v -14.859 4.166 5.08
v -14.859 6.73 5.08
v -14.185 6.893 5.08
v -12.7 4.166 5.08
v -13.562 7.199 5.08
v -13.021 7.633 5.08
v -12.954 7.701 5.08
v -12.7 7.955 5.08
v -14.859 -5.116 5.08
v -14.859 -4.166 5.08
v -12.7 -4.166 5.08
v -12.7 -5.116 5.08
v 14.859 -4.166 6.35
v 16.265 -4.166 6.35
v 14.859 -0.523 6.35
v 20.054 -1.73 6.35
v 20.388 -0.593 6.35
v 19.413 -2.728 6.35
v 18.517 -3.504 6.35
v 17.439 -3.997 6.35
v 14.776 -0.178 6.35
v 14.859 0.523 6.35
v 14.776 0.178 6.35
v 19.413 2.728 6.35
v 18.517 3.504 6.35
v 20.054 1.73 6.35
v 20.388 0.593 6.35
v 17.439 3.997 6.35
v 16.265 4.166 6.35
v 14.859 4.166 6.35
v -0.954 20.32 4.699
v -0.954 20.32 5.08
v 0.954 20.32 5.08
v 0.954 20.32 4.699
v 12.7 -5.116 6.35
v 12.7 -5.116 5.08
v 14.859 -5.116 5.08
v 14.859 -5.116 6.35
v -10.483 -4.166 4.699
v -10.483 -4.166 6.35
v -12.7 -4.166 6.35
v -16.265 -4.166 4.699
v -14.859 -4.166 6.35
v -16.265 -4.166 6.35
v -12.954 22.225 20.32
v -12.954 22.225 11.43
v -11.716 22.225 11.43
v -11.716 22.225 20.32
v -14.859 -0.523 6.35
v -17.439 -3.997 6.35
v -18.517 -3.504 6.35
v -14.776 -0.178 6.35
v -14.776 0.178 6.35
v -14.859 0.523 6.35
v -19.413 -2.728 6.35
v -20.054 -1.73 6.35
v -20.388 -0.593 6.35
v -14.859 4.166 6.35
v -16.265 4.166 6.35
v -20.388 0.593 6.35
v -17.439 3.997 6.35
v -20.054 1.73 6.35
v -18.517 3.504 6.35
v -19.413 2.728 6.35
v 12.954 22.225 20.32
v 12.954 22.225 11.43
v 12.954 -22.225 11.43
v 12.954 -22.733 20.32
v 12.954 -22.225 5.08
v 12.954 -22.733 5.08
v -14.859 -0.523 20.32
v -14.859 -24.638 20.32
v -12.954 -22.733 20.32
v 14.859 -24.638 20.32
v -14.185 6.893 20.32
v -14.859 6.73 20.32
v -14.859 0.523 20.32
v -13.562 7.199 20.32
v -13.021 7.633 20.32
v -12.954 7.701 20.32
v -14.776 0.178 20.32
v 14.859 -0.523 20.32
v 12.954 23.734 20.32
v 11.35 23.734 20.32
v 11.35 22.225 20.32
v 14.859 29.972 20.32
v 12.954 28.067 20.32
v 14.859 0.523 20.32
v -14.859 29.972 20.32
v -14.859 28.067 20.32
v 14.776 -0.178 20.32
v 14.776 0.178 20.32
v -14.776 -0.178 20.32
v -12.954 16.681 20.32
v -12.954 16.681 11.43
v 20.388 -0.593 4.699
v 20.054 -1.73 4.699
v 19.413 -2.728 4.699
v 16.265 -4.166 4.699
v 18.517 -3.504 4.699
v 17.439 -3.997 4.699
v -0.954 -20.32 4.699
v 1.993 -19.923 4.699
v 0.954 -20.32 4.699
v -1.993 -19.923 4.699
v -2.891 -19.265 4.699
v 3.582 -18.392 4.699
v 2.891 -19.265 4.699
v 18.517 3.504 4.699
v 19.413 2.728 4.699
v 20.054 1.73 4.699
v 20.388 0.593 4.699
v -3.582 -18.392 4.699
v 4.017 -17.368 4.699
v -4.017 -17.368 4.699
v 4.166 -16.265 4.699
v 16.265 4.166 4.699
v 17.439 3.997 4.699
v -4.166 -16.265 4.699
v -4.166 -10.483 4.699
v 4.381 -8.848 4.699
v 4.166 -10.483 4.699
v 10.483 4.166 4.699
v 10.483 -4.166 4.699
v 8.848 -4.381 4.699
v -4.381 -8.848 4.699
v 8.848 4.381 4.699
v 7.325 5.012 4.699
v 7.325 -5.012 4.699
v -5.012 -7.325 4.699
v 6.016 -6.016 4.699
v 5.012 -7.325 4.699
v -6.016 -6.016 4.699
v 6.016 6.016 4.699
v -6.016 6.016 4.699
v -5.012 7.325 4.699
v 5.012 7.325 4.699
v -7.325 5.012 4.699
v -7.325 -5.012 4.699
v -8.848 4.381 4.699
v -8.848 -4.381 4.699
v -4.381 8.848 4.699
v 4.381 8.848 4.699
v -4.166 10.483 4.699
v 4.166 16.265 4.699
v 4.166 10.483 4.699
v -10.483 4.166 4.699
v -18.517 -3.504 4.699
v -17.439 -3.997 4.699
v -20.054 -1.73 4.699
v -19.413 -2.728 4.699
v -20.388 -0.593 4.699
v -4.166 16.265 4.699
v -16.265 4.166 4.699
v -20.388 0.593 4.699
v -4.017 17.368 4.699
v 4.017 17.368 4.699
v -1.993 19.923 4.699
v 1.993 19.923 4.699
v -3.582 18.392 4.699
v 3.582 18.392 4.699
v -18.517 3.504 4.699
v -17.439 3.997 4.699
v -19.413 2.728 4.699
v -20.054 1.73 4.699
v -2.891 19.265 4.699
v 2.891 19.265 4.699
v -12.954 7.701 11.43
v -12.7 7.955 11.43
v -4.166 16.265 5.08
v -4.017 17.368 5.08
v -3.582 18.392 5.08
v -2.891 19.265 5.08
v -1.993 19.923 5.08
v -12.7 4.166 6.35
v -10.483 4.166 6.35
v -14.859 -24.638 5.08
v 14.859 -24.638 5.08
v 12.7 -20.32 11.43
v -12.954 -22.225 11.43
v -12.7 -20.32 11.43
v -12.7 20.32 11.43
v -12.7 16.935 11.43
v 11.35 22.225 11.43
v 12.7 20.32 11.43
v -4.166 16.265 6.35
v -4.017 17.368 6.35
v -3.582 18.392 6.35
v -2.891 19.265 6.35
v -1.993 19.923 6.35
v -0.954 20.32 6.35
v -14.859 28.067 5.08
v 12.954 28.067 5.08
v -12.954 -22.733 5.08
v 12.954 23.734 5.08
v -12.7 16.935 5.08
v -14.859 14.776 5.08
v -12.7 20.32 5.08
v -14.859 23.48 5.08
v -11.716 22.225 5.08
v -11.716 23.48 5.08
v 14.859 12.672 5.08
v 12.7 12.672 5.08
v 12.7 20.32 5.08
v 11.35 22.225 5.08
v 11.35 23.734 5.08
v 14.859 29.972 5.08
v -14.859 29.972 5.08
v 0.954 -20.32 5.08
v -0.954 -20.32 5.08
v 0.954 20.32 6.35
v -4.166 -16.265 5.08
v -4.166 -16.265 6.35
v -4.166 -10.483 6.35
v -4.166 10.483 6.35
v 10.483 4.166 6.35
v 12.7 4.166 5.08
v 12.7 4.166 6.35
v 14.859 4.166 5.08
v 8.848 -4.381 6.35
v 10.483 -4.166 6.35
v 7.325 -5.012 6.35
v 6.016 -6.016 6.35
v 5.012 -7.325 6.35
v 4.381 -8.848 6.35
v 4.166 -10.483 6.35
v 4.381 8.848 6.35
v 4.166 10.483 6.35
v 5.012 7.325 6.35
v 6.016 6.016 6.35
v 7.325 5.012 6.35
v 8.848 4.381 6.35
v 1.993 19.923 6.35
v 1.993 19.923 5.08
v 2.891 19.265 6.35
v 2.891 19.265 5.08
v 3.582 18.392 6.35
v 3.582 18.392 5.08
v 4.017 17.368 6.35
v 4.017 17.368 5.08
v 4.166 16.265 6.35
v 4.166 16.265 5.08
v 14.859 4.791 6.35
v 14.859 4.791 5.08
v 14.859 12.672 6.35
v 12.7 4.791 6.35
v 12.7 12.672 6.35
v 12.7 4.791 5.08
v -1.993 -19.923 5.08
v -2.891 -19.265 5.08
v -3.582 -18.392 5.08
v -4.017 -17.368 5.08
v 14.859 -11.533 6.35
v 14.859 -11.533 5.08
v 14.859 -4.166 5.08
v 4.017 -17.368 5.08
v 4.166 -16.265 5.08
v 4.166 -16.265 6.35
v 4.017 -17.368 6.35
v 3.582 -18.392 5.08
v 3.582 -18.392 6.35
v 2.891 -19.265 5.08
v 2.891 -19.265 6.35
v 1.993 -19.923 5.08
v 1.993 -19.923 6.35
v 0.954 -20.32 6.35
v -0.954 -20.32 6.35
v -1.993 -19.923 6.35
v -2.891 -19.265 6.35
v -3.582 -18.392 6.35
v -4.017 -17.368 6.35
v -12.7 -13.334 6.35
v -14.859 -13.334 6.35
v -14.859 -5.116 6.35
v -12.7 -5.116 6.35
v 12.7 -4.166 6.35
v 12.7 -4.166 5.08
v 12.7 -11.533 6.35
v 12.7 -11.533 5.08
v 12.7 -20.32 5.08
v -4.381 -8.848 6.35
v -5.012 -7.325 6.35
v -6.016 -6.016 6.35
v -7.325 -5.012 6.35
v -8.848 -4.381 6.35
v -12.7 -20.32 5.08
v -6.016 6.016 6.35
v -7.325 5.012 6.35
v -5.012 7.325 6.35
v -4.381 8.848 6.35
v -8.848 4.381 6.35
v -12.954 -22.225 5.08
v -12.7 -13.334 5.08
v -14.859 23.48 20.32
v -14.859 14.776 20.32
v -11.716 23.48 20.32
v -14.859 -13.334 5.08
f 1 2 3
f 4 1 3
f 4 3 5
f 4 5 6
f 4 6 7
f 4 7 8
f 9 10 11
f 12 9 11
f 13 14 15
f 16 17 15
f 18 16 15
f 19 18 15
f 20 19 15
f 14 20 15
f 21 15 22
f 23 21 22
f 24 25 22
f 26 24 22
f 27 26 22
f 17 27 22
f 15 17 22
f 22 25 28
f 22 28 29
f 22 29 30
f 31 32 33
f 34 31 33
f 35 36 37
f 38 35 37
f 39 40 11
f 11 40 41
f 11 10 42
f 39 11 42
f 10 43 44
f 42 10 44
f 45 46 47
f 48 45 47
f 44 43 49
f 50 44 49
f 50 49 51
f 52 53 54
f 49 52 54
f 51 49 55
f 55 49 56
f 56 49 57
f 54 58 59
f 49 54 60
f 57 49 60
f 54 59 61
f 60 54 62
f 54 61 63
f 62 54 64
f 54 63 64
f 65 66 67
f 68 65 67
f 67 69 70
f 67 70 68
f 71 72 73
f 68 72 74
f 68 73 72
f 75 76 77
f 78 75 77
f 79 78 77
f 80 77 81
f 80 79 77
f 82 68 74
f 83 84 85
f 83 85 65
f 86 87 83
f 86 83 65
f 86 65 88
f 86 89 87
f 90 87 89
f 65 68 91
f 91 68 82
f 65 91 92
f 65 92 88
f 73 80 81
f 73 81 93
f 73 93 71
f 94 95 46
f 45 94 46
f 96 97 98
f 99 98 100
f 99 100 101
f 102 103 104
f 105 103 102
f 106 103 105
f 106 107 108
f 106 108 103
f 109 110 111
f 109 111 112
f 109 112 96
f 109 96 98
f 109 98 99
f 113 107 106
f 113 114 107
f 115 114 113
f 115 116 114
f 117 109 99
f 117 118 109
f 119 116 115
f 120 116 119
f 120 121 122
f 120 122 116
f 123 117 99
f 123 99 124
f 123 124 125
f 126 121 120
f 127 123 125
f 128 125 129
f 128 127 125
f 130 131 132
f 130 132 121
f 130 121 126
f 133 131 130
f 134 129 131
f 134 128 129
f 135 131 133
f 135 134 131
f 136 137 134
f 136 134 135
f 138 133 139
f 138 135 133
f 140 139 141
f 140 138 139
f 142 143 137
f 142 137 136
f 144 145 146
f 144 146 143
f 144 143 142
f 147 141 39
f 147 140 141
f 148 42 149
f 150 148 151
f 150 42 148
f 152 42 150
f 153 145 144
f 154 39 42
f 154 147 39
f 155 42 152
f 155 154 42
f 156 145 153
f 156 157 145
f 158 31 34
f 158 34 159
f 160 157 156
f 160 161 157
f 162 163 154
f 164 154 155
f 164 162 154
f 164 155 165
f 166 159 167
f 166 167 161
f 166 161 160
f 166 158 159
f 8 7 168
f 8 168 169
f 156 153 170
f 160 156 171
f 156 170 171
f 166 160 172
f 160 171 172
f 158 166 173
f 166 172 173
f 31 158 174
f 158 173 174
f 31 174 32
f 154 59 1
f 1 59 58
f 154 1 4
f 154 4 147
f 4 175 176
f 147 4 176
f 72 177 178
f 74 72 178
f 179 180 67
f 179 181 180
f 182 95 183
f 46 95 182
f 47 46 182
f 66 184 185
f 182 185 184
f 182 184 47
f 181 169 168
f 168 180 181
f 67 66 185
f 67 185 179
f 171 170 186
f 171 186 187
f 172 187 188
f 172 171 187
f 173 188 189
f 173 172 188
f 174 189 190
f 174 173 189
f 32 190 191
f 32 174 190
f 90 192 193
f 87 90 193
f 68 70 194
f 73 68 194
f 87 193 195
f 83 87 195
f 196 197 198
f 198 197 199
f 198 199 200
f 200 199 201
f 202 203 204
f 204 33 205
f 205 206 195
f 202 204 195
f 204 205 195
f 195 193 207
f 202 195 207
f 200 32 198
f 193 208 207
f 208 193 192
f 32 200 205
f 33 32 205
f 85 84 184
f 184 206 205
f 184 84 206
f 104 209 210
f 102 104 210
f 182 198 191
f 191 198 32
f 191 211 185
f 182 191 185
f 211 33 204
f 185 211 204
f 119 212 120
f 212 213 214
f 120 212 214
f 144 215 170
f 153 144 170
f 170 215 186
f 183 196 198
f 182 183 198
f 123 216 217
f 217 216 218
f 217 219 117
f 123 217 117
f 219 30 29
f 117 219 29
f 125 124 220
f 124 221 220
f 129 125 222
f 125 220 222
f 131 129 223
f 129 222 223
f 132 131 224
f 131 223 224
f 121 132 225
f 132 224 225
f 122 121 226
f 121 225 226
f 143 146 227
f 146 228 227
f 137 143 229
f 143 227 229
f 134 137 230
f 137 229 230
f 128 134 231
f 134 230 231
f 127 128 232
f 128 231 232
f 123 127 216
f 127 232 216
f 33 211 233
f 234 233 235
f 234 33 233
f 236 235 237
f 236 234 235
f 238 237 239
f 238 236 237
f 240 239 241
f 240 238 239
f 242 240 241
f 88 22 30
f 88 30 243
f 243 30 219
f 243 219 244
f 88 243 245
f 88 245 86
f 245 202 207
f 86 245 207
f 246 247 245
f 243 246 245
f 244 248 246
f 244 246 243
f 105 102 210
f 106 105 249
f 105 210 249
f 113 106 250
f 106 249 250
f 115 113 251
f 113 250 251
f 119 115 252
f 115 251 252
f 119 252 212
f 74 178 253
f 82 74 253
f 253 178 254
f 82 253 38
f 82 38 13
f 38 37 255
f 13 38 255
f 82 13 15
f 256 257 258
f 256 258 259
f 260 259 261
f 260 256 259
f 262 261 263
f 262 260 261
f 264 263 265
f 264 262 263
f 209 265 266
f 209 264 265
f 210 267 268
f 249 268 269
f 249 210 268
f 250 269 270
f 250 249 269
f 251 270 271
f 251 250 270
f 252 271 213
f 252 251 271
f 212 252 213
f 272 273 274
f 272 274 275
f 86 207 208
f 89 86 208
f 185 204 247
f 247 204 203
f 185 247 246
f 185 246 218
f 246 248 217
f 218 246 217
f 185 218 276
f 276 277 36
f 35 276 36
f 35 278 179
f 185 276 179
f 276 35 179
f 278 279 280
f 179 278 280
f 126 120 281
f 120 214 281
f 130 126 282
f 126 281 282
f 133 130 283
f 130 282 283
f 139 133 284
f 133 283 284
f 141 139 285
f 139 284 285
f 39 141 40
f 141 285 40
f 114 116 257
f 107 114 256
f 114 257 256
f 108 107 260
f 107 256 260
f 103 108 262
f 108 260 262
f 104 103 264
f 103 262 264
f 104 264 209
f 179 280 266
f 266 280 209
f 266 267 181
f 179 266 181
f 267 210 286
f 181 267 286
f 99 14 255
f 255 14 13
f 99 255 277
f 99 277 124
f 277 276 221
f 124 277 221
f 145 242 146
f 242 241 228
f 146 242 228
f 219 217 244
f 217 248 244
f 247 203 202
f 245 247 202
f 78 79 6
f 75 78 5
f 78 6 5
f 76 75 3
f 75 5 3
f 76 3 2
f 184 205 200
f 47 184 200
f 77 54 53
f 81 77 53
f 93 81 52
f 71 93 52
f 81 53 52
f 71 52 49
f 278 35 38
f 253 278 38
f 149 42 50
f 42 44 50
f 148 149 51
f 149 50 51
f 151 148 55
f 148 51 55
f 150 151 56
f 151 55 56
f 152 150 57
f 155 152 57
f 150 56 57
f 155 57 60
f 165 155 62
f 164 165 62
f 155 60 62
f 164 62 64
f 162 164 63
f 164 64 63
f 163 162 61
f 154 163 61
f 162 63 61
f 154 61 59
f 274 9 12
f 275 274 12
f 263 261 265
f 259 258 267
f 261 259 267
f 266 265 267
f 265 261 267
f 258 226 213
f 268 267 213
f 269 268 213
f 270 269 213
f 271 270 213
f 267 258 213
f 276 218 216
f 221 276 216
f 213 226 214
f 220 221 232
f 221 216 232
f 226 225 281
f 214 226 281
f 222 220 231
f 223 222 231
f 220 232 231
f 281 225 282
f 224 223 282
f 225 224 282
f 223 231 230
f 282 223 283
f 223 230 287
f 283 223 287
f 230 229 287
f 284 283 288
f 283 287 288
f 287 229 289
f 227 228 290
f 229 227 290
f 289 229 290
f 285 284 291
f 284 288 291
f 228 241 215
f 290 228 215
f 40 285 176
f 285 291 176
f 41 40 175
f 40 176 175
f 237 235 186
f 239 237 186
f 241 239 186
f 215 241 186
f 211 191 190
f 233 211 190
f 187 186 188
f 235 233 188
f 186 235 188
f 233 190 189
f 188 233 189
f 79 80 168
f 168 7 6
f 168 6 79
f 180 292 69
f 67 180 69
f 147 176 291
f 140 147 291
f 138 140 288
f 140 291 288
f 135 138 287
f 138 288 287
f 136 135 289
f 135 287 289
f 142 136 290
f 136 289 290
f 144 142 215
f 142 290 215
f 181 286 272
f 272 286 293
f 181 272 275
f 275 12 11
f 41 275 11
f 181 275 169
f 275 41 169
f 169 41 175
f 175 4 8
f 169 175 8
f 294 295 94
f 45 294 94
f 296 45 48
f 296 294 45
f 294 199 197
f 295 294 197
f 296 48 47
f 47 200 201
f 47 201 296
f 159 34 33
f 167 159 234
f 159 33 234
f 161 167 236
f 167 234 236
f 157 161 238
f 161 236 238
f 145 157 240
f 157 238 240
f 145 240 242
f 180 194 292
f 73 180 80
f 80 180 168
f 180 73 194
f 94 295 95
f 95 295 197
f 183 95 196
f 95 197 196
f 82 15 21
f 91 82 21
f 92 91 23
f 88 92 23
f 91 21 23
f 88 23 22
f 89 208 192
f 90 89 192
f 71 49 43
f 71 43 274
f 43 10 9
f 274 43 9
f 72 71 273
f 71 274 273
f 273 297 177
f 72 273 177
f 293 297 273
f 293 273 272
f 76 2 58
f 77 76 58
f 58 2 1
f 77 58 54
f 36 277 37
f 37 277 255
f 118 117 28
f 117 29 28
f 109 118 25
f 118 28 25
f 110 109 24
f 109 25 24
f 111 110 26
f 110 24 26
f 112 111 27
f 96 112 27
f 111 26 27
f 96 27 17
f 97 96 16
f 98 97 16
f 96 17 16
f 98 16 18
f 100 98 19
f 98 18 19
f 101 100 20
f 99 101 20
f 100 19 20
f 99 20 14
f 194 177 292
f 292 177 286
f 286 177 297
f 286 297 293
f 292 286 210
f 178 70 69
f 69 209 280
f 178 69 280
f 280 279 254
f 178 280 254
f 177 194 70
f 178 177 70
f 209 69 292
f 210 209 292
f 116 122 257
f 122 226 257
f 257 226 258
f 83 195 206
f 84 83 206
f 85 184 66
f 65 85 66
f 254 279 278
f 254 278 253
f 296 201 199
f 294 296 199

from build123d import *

# Parameters (mm, degrees)
X_WING_DEPTH        = 12.7
SKETCH4_3_R         = 1.5
SKETCH4_3_R_2       = 3.175
HOLES_DEPTH         = 9.525
CHIP_DEPTH          = 6.35
EXTRUDE_9V_DEPTH    = 15.24
SKETCH6_3_R         = 1.27
AIR_HOLES_DEPTH     = 9.525
LIFT_START          = 5.08
LIFT_DEPTH          = 1.27
SKETCH7_W           = 7.542953633
SKETCH7_H           = 7.880697826
SKETCH7_H_2         = 6.417139658
SKETCH7_W_2         = 5.741651273
SKETCH7_H_3         = 8.218442018
AIR_SLOTS_DEPTH     = 1.27
BOSS_EXTRUDE1_DEPTH = 0.381


with BuildPart() as part:
    # Sketch2 → Body (revolve)
    with BuildSketch(Plane(origin=(0, 0, 0), x_dir=(0, 0, -1), z_dir=(1, 0, 0))):
        Polygon((4.4704, 13.9065), (0, 12.5857), (0, 0), (-5.08, 0), (-5.08, 49.53), (64.831152593, 49.53), (64.831152593, 39.37), (59.751152593, 39.37), (59.751152593, 44.45), (0, 44.45), (0, 16.4465), (4.4704, 16.4465), align=None)
    revolve(axis=Axis((0, 0, 0), (0, 0, 1)))

    # Sketch4 → X-Wing (cut)
    with BuildSketch(Plane.XY):
        with BuildLine():
            Line((-4.1656, -12.04250002), (-4.1656, -10.483480973))
            ThreePointArc((-4.1656, -10.483480973), (-6.016064494, -6.016064494), (-10.483480973, -4.1656))
            Line((-10.483480973, -4.1656), (-16.265, -4.1656))
            ThreePointArc((-16.265, -4.1656), (-20.4306, 0), (-16.265, 4.1656))
            Line((-16.265, 4.1656), (-12.04250002, 4.1656))
            Line((-12.04250002, 4.1656), (-10.483480973, 4.1656))
            ThreePointArc((-10.483480973, 4.1656), (-6.016064494, 6.016064494), (-4.1656, 10.483480973))
            Line((-4.1656, 10.483480973), (-4.1656, 12.04250002))
            Line((-4.1656, 12.04250002), (-4.1656, 16.265))
            ThreePointArc((-4.1656, 16.265), (0, 20.4306), (4.1656, 16.265))
            Line((4.1656, 16.265), (4.1656, 12.04250002))
            Line((4.1656, 12.04250002), (4.1656, 10.483480973))
            ThreePointArc((4.1656, 10.483480973), (6.016064494, 6.016064494), (10.483480973, 4.1656))
            Line((10.483480973, 4.1656), (12.04250002, 4.1656))
            Line((12.04250002, 4.1656), (16.265, 4.1656))
            ThreePointArc((16.265, 4.1656), (20.4306, 0), (16.265, -4.1656))
            Line((16.265, -4.1656), (12.04250002, -4.1656))
            Line((12.04250002, -4.1656), (10.483480973, -4.1656))
            ThreePointArc((10.483480973, -4.1656), (6.016064494, -6.016064494), (4.1656, -10.483480973))
            Line((4.1656, -10.483480973), (4.1656, -12.04250002))
            Line((4.1656, -12.04250002), (4.1656, -16.265))
            ThreePointArc((4.1656, -16.265), (0, -20.4306), (-4.1656, -16.265))
            Line((-4.1656, -16.265), (-4.1656, -12.04250002))
        make_face()
    extrude(amount=-X_WING_DEPTH, mode=Mode.SUBTRACT)

    # Sketch4<3> → Holes (cut)
    with BuildSketch(Plane.XY):
        with Locations(Location((0, -16.265, 0), (0, 0, 180))):
            Circle(SKETCH4_3_R)
        with Locations(Location((-16.265, 0, 0), (0, 0, 180))):
            Circle(SKETCH4_3_R)
        with Locations(Location((16.265, 0, 0), (0, 0, 180))):
            Circle(SKETCH4_3_R)
        with Locations(Location((0, 16.265, 0), (0, 0, 180))):
            Circle(SKETCH4_3_R)
        with BuildLine():
            ThreePointArc((-7.633217703, 13.021371376), (-7.633217703, 17.511499436), (-12.123345763, 17.511499436))
            Line((-12.123345763, 17.511499436), (-17.511499436, 12.123345763))
            ThreePointArc((-17.511499436, 12.123345763), (-17.511499436, 7.633217703), (-13.021371376, 7.633217703))
            Line((-13.021371376, 7.633217703), (-7.633217703, 13.021371376))
        make_face()
        with Locations((-8.261128525, 8.261128525)):
            Circle(SKETCH4_3_R_2)
        with Locations(Location((8.261128525, 8.261128525, 0), (0, 0, 125.826899667))):
            Circle(SKETCH4_3_R_2)
        with Locations(Location((8.261128525, -8.261128525, 0), (0, 0, 234.173100333))):
            Circle(SKETCH4_3_R_2)
        with Locations(Location((-8.261128525, -8.261128525, 0), (0, 0, 144.173100333))):
            Circle(SKETCH4_3_R_2)
    extrude(amount=HOLES_DEPTH, mode=Mode.SUBTRACT)

    # Sketch6 → Chip (add)
    with BuildSketch(Plane.XY.offset(5.08)):
        Polygon((11.350015507, 22.225), (-11.715690517, 22.225), (-12.954, 22.225), (-12.954, 16.6808452), (-12.7, 16.9348452), (-12.7, 20.32), (12.7, 20.32), (12.7, -20.32), (-12.7, -20.32), (-12.7, 7.954589078), (-12.954, 7.700589078), (-12.954, -22.225), (12.954, -22.225), (12.954, 22.225), align=None)
    extrude(amount=CHIP_DEPTH)

    # Sketch6<4> → Extrude 9V (add)
    with BuildSketch(Plane.XY.offset(5.08)):
        Polygon((-14.859, 14.7758452), (-12.954, 16.6808452), (-12.954, 22.225), (-11.715690517, 22.225), (-11.715690517, 23.479848526), (-14.859, 23.479848526), align=None)
        with BuildLine():
            ThreePointArc((-13.021371376, 7.633217703), (-13.865328691, 7.029154679), (-14.859, 6.729532555))
            Line((-14.859, 6.729532555), (-14.859, 0.522650935))
            ThreePointArc((-14.859, 0.522650935), (-14.765, 0), (-14.859, -0.522650935))
            Line((-14.859, -0.522650935), (-14.859, -24.638))
            Line((-14.859, -24.638), (14.859, -24.638))
            Line((14.859, -24.638), (14.859, -0.522650935))
            ThreePointArc((14.859, -0.522650935), (14.765, 0), (14.859, 0.522650935))
            Line((14.859, 0.522650935), (14.859, 29.972))
            Line((14.859, 29.972), (-14.859, 29.972))
            Line((-14.859, 29.972), (-14.859, 28.067))
            Line((-14.859, 28.067), (12.954, 28.067))
            Line((12.954, 28.067), (12.954, 23.734213344))
            Line((12.954, 23.734213344), (11.350015507, 23.734213344))
            Line((11.350015507, 23.734213344), (11.350015507, 22.225))
            Line((11.350015507, 22.225), (12.954, 22.225))
            Line((12.954, 22.225), (12.954, -22.733))
            Line((12.954, -22.733), (-12.954, -22.733))
            Line((-12.954, -22.733), (-12.954, 7.700589078))
            Line((-12.954, 7.700589078), (-13.021371376, 7.633217703))
        make_face()
    extrude(amount=EXTRUDE_9V_DEPTH)

    # Sketch6<3> → Air holes (cut)
    with BuildSketch(Plane.XY.offset(5.08)):
        with Locations((-23.749, -23.368)):
            Circle(SKETCH6_3_R)
        with Locations((23.114, -15.748)):
            Circle(SKETCH6_3_R)
        with Locations((-9.906, 36.322)):
            Circle(SKETCH6_3_R)
        with Locations((18.034, 36.322)):
            Circle(SKETCH6_3_R)
    extrude(amount=-AIR_HOLES_DEPTH, mode=Mode.SUBTRACT)

    # Sketch4<4> → Lift (add)
    with BuildSketch(Plane.XY.offset(LIFT_START)):
        with BuildLine():
            Line((-4.1656, -12.04250002), (-4.1656, -10.483480973))
            ThreePointArc((-4.1656, -10.483480973), (-6.016064494, -6.016064494), (-10.483480973, -4.1656))
            Line((-10.483480973, -4.1656), (-16.265, -4.1656))
            ThreePointArc((-16.265, -4.1656), (-20.4306, 0), (-16.265, 4.1656))
            Line((-16.265, 4.1656), (-12.04250002, 4.1656))
            Line((-12.04250002, 4.1656), (-10.483480973, 4.1656))
            ThreePointArc((-10.483480973, 4.1656), (-6.016064494, 6.016064494), (-4.1656, 10.483480973))
            Line((-4.1656, 10.483480973), (-4.1656, 12.04250002))
            Line((-4.1656, 12.04250002), (-4.1656, 16.265))
            ThreePointArc((-4.1656, 16.265), (0, 20.4306), (4.1656, 16.265))
            Line((4.1656, 16.265), (4.1656, 12.04250002))
            Line((4.1656, 12.04250002), (4.1656, 10.483480973))
            ThreePointArc((4.1656, 10.483480973), (6.016064494, 6.016064494), (10.483480973, 4.1656))
            Line((10.483480973, 4.1656), (12.04250002, 4.1656))
            Line((12.04250002, 4.1656), (16.265, 4.1656))
            ThreePointArc((16.265, 4.1656), (20.4306, 0), (16.265, -4.1656))
            Line((16.265, -4.1656), (12.04250002, -4.1656))
            Line((12.04250002, -4.1656), (10.483480973, -4.1656))
            ThreePointArc((10.483480973, -4.1656), (6.016064494, -6.016064494), (4.1656, -10.483480973))
            Line((4.1656, -10.483480973), (4.1656, -12.04250002))
            Line((4.1656, -12.04250002), (4.1656, -16.265))
            ThreePointArc((4.1656, -16.265), (0, -20.4306), (-4.1656, -16.265))
            Line((-4.1656, -16.265), (-4.1656, -12.04250002))
        make_face()
    extrude(amount=LIFT_DEPTH)

    # Sketch7 → Air Slots (cut)
    with BuildSketch(Plane.XY.offset(5.08)):
        with Locations((15.537525525, 8.731732869)):
            Rectangle(SKETCH7_W, SKETCH7_H)
        with Locations((15.537525525, -8.324348854)):
            Rectangle(SKETCH7_W, SKETCH7_H_2)
        with Locations((-14.859451804, -9.225000034)):
            Rectangle(SKETCH7_W_2, SKETCH7_H_3)
    extrude(amount=AIR_SLOTS_DEPTH, mode=Mode.SUBTRACT)

    # SurfaceCut1
    split(bisect_by=Plane.XY.offset(5.08), keep=Keep.TOP)

    # Sketch9 → Boss-Extrude1 (add)
    with BuildSketch(Plane(origin=(0, 0, 5.08), x_dir=(-1, 0, 0), z_dir=(0, 0, -1))):
        with BuildLine():
            Line((4.1656, 10.483480973), (4.1656, 16.265))
            ThreePointArc((4.1656, 16.265), (3.265287264, 18.8515271), (0.953518935, 20.32))
            Line((0.953518935, 20.32), (-0.953518935, 20.32))
            ThreePointArc((-0.953518935, 20.32), (-3.265287264, 18.8515271), (-4.1656, 16.265))
            Line((-4.1656, 16.265), (-4.1656, 10.483480973))
            ThreePointArc((-4.1656, 10.483480973), (-6.016064494, 6.016064494), (-10.483480973, 4.1656))
            Line((-10.483480973, 4.1656), (-12.7, 4.1656))
            Line((-12.7, 4.1656), (-14.859, 4.1656))
            Line((-14.859, 4.1656), (-16.265, 4.1656))
            ThreePointArc((-16.265, 4.1656), (-20.4306, 0), (-16.265, -4.1656))
            Line((-16.265, -4.1656), (-14.859, -4.1656))
            Line((-14.859, -4.1656), (-12.7, -4.1656))
            Line((-12.7, -4.1656), (-10.483480973, -4.1656))
            ThreePointArc((-10.483480973, -4.1656), (-6.016064494, -6.016064494), (-4.1656, -10.483480973))
            Line((-4.1656, -10.483480973), (-4.1656, -16.265))
            ThreePointArc((-4.1656, -16.265), (-3.265287264, -18.8515271), (-0.953518935, -20.32))
            Line((-0.953518935, -20.32), (0.953518935, -20.32))
            ThreePointArc((0.953518935, -20.32), (3.265287264, -18.8515271), (4.1656, -16.265))
            Line((4.1656, -16.265), (4.1656, -10.483480973))
            ThreePointArc((4.1656, -10.483480973), (6.016064494, -6.016064494), (10.483480973, -4.1656))
            Line((10.483480973, -4.1656), (12.7, -4.1656))
            Line((12.7, -4.1656), (14.859, -4.1656))
            Line((14.859, -4.1656), (16.265, -4.1656))
            ThreePointArc((16.265, -4.1656), (20.4306, 0), (16.265, 4.1656))
            Line((16.265, 4.1656), (14.859, 4.1656))
            Line((14.859, 4.1656), (12.7, 4.1656))
            Line((12.7, 4.1656), (10.483480973, 4.1656))
            ThreePointArc((10.483480973, 4.1656), (6.016064494, 6.016064494), (4.1656, 10.483480973))
        make_face()
    extrude(amount=BOSS_EXTRUDE1_DEPTH)


solid = part.part
